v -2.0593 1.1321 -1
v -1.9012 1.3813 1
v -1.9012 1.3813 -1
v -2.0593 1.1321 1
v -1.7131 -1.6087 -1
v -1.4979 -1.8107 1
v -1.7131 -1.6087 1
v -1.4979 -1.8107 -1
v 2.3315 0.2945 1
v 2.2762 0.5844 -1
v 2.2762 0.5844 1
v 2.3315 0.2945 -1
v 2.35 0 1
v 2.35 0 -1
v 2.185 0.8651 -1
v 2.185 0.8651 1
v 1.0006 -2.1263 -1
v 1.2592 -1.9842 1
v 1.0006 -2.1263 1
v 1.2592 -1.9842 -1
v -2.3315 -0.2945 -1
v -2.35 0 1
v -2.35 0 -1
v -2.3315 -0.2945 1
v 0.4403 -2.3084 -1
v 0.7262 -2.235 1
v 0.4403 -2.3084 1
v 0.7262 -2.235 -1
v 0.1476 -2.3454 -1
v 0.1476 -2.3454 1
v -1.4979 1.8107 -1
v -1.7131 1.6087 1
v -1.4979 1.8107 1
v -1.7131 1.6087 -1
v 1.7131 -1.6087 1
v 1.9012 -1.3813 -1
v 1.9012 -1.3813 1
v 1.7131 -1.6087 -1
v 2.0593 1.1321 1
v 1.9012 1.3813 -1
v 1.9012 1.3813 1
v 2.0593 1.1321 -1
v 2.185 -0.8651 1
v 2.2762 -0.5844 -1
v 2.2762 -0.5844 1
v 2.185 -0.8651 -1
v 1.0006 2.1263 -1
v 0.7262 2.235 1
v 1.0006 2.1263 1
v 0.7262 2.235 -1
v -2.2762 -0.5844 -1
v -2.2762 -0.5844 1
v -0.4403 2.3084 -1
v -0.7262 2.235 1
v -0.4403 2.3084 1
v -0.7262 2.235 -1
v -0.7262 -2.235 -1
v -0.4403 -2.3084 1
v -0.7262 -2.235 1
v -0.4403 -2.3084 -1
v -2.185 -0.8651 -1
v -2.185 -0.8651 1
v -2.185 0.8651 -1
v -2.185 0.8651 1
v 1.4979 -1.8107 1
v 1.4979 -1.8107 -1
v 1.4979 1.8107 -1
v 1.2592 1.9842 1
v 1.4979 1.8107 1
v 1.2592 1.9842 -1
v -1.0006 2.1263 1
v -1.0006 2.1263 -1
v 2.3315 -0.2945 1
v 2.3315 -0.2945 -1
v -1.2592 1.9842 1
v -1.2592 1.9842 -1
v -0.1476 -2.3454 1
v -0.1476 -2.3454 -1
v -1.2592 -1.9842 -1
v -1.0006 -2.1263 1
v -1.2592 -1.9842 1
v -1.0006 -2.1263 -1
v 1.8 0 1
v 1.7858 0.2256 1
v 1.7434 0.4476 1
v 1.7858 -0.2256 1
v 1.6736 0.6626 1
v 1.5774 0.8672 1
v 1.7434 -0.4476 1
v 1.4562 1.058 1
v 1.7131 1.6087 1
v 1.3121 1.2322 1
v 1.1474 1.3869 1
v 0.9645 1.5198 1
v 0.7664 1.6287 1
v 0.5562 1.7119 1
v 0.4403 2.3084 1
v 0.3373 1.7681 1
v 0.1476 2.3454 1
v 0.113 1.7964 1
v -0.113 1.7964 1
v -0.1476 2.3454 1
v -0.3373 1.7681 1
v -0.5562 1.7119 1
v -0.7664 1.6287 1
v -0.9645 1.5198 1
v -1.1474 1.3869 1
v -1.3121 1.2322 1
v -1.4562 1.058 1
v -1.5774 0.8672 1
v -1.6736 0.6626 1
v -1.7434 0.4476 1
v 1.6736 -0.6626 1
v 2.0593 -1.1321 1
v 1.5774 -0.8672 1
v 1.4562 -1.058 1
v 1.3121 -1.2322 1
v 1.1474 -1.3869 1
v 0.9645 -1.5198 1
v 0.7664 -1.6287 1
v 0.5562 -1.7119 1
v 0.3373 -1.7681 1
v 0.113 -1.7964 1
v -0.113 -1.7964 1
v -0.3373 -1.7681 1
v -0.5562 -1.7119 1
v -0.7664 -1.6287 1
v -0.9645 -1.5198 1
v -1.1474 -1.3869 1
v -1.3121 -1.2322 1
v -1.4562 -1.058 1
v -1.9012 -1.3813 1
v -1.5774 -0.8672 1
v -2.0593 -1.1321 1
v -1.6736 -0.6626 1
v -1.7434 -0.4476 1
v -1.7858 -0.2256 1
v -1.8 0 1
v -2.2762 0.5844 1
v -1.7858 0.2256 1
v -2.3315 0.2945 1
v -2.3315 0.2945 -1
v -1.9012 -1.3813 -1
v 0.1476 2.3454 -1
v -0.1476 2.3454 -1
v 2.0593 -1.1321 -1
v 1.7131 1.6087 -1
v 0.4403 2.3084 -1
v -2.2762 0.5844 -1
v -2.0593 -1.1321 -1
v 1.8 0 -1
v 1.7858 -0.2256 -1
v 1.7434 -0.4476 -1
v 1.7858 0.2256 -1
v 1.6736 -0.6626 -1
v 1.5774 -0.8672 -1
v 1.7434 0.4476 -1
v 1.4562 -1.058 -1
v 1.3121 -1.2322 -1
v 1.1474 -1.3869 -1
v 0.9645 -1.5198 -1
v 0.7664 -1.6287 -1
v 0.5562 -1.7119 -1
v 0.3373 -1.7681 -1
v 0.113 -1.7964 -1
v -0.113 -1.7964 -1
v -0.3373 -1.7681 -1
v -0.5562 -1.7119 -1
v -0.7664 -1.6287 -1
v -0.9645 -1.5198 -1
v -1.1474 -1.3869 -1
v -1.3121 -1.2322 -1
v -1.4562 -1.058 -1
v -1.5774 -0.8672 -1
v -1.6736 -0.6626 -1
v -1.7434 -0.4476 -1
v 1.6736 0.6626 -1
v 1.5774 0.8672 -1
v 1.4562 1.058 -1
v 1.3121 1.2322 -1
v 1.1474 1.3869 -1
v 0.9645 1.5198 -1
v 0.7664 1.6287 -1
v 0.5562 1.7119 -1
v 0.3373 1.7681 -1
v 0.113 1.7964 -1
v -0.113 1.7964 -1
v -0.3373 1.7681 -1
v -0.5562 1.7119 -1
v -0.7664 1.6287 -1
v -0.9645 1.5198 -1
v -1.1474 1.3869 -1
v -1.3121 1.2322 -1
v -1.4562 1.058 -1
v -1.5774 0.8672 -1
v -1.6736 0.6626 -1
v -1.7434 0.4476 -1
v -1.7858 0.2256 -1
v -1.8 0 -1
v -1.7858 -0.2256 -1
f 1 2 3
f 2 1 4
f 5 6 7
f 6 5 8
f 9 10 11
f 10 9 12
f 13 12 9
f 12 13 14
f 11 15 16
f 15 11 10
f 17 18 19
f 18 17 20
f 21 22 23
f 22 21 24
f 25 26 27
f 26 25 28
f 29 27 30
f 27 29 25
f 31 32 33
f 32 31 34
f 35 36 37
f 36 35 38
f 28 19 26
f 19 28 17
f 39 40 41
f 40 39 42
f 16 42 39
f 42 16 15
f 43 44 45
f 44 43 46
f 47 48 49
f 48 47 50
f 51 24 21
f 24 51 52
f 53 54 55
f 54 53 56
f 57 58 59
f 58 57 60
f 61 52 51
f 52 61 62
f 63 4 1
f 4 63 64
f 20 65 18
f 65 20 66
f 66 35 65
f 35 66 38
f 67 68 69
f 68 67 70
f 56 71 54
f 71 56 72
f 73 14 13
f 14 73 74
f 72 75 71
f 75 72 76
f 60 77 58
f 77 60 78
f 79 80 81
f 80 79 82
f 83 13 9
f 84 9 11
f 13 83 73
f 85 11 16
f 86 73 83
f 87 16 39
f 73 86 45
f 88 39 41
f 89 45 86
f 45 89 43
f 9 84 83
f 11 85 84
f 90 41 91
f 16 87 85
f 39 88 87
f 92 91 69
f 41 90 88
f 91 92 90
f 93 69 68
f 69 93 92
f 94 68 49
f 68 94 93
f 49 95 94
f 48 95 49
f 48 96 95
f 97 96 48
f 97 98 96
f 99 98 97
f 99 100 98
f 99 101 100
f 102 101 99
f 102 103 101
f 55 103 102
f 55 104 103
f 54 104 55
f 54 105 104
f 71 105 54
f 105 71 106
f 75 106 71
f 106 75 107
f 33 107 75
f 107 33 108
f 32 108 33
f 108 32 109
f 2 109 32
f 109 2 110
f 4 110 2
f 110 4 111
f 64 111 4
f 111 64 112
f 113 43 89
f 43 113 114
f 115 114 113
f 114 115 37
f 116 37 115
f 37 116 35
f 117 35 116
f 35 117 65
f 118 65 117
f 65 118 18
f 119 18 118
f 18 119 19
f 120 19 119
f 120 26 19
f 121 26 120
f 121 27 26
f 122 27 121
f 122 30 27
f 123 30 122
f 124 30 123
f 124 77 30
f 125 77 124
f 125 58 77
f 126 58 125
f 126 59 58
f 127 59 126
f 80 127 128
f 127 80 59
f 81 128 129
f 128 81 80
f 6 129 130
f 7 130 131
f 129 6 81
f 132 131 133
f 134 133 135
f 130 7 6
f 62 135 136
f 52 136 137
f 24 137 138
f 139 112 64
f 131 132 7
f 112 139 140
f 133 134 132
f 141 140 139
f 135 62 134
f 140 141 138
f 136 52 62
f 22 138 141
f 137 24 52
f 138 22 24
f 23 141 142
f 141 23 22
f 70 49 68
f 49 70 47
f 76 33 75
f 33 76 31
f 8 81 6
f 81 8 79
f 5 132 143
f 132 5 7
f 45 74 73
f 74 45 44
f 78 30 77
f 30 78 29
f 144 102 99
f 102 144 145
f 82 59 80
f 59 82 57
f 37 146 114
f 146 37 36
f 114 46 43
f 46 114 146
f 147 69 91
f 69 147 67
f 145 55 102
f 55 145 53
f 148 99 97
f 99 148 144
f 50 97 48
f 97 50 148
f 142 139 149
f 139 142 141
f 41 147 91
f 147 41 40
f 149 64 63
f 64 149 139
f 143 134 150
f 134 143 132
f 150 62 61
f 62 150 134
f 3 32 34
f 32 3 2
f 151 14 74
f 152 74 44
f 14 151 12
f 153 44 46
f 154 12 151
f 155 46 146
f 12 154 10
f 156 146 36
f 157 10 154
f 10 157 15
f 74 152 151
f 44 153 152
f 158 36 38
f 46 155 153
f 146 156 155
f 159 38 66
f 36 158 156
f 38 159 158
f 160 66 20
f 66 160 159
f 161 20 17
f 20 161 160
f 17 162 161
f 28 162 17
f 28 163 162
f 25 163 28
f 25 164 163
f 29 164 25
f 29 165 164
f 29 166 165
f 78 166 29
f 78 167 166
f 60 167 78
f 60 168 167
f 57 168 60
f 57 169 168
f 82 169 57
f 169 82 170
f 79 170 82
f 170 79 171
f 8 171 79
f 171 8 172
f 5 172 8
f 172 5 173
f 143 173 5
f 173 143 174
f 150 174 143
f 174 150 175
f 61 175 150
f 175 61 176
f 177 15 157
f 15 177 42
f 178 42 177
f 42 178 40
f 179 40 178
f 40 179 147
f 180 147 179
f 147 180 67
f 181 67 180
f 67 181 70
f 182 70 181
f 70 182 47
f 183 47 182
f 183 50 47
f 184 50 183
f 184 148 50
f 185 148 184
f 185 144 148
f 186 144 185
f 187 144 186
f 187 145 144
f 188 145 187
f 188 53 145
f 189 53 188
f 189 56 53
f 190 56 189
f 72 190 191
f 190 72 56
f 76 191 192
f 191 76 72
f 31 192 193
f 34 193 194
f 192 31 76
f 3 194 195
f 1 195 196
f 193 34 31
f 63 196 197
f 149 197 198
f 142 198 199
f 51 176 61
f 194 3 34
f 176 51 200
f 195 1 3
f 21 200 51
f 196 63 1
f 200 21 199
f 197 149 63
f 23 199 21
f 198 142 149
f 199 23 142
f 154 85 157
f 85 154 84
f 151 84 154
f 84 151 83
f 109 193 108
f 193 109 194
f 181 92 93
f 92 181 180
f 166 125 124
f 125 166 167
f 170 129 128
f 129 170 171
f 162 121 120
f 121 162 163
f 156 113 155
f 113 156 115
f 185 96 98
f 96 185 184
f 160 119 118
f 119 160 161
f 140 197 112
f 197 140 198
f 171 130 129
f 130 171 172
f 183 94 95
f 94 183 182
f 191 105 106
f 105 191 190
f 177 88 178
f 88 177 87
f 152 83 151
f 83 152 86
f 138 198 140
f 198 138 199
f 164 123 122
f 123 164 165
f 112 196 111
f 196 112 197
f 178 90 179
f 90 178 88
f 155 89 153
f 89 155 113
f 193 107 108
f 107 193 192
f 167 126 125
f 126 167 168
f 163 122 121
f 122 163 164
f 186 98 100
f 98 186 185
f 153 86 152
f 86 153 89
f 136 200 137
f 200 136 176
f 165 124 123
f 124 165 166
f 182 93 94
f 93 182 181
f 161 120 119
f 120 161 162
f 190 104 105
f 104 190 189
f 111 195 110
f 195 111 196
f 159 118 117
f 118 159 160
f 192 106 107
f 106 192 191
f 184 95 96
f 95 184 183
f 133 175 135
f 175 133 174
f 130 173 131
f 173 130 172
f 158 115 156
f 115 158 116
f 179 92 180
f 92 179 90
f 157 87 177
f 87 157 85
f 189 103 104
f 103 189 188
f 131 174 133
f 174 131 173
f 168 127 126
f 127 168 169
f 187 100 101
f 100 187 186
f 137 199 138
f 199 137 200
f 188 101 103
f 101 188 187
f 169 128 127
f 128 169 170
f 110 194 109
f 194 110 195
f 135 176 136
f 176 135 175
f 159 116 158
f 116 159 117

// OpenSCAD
$fn = 50;


difference() {
	union() {
		translate(v = [0, 0, -1.0000000000]) {
			cylinder(h = 2, r = 2.3500000000);
		}
	}
	union() {
		#translate(v = [0, 0, -100.0000000000]) {
			cylinder(h = 200, r = 1.8000000000);
		}
	}
}
